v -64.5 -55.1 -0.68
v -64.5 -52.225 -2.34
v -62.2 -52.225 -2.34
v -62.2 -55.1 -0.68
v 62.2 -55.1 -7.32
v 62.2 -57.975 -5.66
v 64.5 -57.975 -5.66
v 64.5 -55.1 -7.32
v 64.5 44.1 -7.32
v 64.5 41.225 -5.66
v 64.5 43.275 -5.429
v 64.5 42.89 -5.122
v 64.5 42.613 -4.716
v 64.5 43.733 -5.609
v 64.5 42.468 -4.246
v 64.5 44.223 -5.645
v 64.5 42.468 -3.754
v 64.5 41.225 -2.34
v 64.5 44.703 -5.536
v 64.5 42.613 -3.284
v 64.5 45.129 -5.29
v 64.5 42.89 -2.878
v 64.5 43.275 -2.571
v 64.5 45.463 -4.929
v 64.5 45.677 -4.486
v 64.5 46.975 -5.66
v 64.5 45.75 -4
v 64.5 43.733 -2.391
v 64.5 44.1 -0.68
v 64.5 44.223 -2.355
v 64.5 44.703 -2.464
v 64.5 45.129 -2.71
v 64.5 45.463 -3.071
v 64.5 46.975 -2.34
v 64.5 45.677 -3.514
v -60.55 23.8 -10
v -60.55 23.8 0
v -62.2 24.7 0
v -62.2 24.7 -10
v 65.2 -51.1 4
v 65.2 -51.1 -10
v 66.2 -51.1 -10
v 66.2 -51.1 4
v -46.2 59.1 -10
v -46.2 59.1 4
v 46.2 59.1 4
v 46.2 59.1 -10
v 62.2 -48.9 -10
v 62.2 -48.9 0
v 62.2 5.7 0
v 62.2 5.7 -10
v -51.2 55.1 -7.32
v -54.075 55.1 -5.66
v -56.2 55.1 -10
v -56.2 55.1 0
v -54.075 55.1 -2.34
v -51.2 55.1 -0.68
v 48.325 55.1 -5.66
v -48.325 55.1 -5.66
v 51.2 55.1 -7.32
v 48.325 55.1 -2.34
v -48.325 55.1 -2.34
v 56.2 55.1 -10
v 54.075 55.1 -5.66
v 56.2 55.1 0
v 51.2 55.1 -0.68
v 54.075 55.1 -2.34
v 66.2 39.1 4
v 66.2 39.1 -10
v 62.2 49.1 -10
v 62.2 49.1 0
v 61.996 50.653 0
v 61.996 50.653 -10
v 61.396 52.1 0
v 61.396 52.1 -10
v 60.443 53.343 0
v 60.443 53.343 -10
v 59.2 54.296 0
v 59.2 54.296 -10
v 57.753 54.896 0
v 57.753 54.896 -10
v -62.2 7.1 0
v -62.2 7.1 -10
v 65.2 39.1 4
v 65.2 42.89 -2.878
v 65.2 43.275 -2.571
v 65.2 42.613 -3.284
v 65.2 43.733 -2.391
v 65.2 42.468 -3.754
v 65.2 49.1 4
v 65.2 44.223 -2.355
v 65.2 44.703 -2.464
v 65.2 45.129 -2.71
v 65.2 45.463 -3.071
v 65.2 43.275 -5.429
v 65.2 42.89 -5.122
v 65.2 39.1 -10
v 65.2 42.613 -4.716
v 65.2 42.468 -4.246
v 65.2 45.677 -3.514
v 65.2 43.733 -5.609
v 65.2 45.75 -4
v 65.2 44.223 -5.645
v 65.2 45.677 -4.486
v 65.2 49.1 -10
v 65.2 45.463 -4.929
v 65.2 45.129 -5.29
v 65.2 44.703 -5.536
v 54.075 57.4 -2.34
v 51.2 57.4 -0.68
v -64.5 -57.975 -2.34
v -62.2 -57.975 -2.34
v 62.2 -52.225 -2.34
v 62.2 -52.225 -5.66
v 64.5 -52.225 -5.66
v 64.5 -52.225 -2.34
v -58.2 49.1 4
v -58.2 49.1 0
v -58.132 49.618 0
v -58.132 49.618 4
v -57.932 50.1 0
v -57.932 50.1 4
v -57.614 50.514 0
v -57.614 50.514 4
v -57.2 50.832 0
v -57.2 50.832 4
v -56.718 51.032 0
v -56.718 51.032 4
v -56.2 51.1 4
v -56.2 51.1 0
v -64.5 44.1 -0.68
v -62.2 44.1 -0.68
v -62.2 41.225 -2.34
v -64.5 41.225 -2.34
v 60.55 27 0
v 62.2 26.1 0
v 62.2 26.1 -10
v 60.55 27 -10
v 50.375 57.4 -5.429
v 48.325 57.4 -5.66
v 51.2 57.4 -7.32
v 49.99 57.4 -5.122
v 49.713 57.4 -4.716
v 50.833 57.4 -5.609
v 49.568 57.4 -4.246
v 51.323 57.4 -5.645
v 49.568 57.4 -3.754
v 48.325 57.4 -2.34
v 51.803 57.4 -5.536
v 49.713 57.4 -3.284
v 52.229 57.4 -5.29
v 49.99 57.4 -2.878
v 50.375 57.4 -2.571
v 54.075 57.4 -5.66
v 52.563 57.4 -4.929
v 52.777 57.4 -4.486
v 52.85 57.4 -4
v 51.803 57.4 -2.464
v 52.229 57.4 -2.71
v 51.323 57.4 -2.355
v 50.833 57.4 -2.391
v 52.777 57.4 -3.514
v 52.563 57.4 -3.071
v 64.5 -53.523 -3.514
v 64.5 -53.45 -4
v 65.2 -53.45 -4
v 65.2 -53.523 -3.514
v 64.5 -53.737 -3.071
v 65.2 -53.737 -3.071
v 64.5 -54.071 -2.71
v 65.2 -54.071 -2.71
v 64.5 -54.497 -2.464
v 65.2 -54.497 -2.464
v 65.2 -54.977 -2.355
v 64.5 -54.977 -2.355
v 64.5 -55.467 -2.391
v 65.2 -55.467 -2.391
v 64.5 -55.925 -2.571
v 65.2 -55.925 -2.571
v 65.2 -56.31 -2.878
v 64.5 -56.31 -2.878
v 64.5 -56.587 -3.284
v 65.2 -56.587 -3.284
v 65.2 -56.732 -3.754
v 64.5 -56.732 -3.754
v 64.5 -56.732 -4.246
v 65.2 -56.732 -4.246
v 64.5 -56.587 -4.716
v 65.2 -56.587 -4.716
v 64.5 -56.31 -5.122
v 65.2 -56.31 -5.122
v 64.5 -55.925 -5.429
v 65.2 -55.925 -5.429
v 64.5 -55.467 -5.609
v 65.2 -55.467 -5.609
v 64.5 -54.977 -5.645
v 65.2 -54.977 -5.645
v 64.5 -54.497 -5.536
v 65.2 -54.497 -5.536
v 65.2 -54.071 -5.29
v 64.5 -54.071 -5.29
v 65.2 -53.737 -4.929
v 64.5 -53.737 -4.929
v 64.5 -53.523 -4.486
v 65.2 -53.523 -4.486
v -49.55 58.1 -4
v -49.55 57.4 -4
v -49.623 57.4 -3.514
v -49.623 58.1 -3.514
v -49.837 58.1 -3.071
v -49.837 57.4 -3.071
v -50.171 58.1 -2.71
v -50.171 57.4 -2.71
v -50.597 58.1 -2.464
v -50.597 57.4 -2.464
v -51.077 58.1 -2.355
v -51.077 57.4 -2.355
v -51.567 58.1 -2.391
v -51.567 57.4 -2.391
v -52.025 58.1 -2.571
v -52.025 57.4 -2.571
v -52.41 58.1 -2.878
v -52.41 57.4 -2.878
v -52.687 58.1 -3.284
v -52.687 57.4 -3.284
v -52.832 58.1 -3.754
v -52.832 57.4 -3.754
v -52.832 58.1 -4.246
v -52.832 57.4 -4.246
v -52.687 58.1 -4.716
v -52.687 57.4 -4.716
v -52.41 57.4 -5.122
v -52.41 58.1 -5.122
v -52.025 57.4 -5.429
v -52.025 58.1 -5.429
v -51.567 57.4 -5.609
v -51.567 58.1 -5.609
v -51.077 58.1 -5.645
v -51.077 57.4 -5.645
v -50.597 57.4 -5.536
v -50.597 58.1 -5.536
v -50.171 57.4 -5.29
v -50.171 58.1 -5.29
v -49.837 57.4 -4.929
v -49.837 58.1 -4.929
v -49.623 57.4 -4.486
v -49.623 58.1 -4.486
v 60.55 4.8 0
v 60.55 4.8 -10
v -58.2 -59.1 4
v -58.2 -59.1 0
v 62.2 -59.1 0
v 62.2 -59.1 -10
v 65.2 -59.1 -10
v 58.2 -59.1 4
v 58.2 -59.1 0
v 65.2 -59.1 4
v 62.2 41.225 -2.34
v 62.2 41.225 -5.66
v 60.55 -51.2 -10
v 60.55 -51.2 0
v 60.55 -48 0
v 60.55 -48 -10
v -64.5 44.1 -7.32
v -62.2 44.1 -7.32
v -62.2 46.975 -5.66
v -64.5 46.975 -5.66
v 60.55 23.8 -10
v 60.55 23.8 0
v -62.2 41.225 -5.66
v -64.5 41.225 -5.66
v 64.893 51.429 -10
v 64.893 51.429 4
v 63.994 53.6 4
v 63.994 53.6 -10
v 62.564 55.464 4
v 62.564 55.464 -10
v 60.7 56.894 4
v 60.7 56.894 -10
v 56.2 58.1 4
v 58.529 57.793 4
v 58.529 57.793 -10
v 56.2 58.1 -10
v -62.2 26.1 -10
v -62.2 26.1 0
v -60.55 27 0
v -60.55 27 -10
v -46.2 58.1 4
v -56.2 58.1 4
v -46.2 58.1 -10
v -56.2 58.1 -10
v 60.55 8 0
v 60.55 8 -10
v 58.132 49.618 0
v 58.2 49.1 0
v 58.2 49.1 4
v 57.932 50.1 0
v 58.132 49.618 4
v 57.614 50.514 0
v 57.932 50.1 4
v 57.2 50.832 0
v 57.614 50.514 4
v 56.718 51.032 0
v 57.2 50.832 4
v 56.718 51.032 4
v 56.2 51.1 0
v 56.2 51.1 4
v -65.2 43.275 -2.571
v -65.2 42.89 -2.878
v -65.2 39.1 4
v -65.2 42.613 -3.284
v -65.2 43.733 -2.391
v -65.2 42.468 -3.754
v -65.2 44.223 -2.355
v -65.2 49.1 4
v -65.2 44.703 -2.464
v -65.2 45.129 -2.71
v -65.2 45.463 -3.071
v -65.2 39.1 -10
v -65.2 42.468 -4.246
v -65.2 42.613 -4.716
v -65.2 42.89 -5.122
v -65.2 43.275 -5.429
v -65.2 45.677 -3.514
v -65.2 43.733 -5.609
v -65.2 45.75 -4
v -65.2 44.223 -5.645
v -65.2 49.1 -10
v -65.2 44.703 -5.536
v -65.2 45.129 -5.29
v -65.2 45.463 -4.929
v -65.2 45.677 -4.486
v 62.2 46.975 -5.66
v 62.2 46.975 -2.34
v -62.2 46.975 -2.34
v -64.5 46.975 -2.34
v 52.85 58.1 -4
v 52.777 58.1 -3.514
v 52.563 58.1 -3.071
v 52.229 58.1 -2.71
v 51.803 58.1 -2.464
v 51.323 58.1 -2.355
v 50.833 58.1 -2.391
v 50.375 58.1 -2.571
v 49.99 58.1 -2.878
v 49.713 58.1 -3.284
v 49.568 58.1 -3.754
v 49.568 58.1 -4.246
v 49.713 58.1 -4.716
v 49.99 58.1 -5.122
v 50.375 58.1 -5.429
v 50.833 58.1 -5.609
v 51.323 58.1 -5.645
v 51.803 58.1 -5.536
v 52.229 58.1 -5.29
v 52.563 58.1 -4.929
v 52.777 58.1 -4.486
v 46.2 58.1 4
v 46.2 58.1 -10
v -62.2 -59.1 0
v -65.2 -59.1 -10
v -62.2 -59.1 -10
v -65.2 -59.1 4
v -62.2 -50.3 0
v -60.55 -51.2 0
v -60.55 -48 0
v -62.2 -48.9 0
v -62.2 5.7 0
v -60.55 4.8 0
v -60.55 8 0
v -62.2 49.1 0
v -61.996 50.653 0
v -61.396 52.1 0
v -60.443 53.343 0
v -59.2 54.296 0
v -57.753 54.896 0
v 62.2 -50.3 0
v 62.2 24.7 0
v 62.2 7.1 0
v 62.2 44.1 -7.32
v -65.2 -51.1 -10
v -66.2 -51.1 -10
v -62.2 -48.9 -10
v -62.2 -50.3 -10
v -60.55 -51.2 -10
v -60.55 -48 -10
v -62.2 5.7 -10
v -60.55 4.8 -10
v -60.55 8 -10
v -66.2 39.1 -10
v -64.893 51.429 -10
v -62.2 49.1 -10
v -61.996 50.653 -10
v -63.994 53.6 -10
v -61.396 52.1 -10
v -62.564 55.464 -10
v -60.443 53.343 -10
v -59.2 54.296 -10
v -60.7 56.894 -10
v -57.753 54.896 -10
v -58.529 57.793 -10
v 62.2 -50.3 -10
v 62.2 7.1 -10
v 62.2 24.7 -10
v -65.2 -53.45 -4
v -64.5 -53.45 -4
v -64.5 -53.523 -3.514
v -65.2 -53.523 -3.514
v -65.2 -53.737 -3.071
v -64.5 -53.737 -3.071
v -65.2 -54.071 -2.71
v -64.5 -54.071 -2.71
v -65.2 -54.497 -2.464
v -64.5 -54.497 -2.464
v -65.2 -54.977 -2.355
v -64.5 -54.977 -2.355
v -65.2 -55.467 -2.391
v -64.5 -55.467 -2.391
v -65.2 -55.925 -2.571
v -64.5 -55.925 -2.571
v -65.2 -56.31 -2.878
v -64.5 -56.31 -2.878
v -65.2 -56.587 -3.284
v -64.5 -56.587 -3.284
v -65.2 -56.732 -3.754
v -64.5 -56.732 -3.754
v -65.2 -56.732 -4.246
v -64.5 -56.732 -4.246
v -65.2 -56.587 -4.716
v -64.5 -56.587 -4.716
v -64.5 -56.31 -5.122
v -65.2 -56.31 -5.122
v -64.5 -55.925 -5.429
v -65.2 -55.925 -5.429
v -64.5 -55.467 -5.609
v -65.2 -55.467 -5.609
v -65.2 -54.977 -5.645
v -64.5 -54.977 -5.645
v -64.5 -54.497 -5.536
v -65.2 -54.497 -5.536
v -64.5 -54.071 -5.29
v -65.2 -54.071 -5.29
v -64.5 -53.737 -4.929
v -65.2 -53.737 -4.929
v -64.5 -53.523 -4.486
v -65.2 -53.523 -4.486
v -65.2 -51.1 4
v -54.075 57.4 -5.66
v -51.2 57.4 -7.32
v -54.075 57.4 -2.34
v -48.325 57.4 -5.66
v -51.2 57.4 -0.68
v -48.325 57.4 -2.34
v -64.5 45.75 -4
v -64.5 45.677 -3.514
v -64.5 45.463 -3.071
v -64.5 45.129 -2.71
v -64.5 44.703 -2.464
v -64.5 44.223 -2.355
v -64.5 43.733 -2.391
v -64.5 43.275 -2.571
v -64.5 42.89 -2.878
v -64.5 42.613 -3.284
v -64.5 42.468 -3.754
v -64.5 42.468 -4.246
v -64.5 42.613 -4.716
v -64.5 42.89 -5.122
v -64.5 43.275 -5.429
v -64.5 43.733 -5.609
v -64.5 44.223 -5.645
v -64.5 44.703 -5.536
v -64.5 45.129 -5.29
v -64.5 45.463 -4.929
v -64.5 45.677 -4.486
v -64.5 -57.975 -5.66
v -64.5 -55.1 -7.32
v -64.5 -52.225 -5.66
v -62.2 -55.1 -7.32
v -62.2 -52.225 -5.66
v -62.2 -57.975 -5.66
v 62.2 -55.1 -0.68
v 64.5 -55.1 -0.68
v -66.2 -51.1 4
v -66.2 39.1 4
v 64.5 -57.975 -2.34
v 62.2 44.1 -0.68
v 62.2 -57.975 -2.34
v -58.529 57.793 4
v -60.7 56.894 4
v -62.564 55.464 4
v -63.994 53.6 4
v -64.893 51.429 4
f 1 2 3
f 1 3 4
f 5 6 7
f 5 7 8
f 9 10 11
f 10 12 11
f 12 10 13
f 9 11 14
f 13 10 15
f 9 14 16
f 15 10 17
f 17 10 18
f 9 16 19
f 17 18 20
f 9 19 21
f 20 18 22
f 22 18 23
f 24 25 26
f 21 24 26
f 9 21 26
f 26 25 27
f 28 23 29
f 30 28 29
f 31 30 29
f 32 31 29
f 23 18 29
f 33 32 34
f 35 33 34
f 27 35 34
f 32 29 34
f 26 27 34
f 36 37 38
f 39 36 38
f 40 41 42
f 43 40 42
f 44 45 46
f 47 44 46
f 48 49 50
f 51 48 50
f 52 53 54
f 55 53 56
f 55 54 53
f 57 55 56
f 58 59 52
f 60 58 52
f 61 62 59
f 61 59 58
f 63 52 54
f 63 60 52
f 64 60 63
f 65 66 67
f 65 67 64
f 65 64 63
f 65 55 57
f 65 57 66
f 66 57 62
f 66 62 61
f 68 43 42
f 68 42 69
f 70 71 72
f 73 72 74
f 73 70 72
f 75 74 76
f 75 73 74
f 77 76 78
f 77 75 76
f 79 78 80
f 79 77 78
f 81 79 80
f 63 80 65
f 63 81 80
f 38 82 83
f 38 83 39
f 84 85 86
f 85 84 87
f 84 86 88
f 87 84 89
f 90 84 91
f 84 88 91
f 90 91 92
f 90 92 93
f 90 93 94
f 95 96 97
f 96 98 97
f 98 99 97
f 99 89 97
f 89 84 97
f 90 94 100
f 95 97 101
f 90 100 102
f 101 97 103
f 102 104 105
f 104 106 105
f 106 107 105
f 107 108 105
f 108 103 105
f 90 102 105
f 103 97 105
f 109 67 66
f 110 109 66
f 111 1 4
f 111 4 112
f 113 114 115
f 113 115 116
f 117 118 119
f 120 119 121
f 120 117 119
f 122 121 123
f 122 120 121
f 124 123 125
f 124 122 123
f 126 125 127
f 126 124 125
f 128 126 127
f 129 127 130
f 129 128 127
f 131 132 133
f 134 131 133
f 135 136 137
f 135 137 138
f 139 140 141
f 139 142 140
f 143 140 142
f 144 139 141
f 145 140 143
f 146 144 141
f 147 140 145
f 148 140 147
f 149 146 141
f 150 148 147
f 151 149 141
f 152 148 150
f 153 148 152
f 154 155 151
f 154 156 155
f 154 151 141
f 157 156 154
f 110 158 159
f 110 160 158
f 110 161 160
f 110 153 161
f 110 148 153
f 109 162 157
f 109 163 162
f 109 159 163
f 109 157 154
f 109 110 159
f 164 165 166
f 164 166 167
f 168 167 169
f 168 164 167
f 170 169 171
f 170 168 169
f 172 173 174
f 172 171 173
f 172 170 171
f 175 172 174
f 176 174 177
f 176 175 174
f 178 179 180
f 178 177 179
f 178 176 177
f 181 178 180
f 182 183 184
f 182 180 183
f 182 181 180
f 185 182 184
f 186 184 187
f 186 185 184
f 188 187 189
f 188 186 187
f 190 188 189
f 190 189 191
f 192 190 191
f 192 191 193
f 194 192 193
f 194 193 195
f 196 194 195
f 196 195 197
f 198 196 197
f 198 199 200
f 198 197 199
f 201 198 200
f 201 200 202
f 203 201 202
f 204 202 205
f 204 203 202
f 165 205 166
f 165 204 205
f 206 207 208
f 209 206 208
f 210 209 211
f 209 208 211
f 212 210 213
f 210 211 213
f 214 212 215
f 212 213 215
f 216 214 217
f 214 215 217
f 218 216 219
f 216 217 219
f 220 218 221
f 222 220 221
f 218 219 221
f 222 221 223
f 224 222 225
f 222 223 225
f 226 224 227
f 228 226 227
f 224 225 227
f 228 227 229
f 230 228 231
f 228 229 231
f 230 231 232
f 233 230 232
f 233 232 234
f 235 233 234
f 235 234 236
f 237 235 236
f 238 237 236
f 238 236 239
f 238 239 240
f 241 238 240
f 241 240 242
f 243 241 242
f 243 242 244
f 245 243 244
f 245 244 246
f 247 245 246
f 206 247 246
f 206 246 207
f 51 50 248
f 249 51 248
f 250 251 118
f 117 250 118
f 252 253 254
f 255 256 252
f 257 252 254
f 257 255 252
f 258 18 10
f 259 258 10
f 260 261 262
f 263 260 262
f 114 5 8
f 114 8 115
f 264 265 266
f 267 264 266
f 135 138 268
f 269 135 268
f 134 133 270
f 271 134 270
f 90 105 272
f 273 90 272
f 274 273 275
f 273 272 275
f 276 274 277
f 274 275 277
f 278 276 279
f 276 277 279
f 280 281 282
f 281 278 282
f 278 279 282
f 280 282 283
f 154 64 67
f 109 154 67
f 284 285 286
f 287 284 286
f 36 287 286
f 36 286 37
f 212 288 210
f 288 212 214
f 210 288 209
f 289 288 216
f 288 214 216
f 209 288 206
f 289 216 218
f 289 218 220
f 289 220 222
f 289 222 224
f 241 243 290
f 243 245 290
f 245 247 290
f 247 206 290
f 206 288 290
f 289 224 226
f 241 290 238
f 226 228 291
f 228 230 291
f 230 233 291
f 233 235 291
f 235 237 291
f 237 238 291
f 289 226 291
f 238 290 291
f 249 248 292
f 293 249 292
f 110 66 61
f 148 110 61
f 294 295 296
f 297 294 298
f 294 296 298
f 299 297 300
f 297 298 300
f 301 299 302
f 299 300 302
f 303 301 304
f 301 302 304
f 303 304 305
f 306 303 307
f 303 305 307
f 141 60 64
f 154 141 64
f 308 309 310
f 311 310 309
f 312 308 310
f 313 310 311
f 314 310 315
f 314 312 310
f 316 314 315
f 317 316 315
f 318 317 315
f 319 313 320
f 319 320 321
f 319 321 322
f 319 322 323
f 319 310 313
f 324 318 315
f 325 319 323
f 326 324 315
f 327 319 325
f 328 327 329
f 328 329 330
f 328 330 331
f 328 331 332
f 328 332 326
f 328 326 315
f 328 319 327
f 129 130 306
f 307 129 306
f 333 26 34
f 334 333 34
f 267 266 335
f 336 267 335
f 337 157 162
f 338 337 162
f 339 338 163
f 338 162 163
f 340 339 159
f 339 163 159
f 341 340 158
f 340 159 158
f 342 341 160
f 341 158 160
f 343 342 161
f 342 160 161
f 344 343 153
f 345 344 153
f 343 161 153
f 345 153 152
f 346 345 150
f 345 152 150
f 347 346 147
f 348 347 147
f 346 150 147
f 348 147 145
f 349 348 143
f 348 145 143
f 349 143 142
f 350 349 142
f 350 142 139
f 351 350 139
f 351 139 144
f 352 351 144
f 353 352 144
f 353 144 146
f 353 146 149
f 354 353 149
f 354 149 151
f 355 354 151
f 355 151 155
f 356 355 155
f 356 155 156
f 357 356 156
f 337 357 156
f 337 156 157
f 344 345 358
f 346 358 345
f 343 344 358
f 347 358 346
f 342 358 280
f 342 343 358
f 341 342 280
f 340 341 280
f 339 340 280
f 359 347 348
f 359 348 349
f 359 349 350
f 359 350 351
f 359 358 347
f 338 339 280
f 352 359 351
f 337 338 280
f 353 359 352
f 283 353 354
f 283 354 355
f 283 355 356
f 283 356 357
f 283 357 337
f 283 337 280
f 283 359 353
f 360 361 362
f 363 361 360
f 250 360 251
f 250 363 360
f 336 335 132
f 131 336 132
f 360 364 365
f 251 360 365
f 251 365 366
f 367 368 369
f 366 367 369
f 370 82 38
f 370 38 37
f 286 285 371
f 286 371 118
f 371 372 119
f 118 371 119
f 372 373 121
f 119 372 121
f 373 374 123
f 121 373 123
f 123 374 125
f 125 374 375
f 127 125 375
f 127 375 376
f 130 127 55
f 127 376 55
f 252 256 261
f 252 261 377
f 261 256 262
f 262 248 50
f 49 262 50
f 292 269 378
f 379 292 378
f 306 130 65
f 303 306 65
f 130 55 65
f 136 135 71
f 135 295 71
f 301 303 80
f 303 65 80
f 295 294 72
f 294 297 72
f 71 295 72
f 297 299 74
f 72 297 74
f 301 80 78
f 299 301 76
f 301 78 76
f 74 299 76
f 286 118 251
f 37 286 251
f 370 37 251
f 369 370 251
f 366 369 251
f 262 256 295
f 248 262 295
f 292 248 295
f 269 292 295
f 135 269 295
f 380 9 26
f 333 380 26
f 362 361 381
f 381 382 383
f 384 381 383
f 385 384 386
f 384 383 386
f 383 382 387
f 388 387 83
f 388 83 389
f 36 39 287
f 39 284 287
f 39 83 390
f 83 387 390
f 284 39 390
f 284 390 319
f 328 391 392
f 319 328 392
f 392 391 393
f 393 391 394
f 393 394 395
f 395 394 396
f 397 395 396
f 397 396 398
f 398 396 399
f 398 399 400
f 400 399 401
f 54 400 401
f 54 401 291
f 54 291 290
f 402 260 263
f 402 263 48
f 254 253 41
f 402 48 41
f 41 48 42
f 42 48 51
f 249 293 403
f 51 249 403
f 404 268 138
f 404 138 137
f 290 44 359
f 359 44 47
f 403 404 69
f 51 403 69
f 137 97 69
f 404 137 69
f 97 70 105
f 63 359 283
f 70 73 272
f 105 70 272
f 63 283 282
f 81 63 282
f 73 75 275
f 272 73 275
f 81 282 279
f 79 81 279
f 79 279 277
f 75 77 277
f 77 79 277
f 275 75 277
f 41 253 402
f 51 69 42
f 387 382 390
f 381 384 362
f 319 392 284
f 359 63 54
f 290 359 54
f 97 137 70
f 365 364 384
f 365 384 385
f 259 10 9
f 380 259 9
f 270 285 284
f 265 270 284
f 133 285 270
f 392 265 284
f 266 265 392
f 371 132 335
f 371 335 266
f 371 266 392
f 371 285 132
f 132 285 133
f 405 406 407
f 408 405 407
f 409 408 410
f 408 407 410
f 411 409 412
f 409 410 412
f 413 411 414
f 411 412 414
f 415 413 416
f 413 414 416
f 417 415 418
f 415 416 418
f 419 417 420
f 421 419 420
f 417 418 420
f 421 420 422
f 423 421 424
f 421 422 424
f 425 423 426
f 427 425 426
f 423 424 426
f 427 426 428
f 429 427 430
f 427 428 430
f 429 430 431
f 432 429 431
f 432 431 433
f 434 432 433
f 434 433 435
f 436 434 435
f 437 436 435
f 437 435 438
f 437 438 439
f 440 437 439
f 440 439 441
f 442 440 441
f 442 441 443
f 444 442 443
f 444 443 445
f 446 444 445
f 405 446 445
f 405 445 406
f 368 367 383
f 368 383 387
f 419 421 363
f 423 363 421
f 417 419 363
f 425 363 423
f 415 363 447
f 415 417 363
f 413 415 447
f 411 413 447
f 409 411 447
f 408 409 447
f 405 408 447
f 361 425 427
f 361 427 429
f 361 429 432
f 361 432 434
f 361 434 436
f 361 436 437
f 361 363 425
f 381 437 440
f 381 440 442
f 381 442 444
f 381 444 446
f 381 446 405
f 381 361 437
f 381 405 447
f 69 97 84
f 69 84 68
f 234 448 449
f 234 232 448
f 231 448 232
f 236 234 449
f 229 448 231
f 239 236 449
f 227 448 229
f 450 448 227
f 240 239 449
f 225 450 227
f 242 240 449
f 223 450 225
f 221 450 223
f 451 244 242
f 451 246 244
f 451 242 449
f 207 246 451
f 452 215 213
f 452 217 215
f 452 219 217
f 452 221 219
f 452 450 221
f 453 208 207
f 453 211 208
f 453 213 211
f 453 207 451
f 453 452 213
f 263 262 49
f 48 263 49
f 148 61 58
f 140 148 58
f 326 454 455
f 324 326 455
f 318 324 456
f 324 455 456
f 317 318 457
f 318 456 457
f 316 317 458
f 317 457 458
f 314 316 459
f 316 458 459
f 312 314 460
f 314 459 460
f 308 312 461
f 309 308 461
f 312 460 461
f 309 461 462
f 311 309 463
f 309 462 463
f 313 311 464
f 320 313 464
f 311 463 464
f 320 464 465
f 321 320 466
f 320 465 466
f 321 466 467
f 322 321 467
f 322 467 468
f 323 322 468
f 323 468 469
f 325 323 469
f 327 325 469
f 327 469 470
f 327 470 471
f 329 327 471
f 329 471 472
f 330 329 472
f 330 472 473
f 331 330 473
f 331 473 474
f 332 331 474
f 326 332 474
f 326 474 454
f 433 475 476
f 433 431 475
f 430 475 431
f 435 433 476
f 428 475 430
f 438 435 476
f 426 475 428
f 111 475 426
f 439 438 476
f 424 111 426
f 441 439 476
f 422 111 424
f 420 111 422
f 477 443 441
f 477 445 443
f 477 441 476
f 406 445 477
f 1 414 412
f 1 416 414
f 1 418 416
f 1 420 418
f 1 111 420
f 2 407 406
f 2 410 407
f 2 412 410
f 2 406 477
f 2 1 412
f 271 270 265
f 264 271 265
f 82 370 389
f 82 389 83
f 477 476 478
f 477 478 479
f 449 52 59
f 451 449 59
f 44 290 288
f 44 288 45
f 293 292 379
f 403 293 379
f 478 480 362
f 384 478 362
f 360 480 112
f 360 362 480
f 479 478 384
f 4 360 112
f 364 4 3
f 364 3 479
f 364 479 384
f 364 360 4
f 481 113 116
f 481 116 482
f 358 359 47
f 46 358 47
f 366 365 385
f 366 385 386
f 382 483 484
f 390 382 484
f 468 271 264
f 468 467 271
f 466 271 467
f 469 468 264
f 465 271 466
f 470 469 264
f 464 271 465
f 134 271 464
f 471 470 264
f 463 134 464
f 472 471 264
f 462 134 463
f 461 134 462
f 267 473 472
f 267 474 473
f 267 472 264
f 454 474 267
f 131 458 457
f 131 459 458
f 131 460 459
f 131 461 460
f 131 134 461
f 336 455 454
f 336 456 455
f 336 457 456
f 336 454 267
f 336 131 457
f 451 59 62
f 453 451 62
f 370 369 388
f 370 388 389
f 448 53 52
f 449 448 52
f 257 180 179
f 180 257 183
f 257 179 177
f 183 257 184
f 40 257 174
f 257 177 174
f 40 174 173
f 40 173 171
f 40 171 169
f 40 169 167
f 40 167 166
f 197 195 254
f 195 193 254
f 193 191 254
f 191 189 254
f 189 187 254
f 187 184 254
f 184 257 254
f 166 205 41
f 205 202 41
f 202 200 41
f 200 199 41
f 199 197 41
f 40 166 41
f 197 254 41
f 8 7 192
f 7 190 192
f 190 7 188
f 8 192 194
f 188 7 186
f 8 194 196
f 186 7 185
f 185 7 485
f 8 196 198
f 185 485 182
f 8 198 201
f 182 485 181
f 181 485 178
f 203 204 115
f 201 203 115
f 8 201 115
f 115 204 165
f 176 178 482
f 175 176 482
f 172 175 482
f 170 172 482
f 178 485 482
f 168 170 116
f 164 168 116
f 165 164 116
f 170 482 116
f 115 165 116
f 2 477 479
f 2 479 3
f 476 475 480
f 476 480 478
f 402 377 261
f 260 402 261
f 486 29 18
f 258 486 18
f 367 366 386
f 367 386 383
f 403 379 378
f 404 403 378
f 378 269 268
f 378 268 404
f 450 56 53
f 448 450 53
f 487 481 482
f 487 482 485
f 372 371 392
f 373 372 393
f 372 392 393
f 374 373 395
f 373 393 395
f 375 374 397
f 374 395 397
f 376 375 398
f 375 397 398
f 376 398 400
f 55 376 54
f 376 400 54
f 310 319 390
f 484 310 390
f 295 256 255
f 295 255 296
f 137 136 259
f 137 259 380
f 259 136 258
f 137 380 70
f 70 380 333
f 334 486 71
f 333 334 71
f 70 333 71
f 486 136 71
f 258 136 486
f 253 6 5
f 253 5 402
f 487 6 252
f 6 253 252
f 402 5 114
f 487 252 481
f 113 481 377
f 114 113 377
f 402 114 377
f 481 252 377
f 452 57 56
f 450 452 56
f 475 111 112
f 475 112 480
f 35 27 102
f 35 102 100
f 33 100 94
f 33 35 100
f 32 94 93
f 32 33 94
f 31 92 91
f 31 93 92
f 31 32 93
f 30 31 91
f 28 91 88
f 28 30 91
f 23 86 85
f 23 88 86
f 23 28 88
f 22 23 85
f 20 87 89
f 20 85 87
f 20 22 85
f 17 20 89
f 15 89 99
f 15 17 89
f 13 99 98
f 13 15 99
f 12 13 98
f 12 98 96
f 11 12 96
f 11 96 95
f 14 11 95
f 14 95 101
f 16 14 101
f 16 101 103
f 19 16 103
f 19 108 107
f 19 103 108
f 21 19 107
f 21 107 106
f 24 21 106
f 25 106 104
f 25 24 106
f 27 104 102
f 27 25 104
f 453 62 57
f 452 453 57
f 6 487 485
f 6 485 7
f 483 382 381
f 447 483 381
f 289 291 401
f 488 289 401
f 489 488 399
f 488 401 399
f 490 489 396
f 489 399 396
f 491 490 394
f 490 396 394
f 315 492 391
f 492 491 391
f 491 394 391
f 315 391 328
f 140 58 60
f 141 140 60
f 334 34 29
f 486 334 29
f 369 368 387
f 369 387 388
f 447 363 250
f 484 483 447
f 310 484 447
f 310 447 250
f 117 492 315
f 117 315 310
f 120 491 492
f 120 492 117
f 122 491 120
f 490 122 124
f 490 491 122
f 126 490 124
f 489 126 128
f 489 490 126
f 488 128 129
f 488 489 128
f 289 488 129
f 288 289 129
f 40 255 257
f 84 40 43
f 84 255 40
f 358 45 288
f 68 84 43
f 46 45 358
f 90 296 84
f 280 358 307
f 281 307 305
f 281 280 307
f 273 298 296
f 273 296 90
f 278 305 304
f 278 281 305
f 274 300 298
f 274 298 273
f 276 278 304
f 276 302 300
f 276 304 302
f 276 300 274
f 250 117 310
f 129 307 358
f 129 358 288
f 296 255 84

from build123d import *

# Parameters (mm, degrees)
SKETCH_W             = 132.4
SKETCH_H             = 118.2
PAD_DEPTH            = 4
PAD_DEPTH_BACK       = 10
SKETCH001_W          = 124.4
SKETCH001_H          = 114.2
POCKET_DEPTH         = 10.001
SKETCH002_W          = 116.4
SKETCH002_H          = 110.2
POCKET001_DEPTH      = 5
FILLET_R             = 6
FILLET001_R          = 10
FILLET002_R          = 2
POCKET002_DEPTH      = 10.001
POCKET002_DEPTH_BACK = 4.001
PAD001_DEPTH         = 10
SKETCH005_W          = 1
SKETCH005_H          = 8
POCKET003_DEPTH      = 10.001
POCKET003_DEPTH_BACK = 4.001
SKETCH006_R          = 1.65
POCKET004_DEPTH      = 66.201
POCKET004_DEPTH_BACK = 66.201
POCKET005_DEPTH      = 64.5
SKETCH008_R          = 1.65
POCKET006_DEPTH      = 59.101
POCKET006_DEPTH_BACK = 59.101
POCKET007_DEPTH      = 57.4


with BuildPart() as part:
    # Sketch → Pad (new body, two sides)
    with BuildSketch(Plane.XY) as pad_sk:
        Rectangle(SKETCH_W, SKETCH_H)
    extrude(amount=PAD_DEPTH)
    extrude(pad_sk.sketch, amount=-PAD_DEPTH_BACK)

    # Sketch001 → Pocket (cut, through all)
    with BuildSketch(Plane.XY):
        with Locations((0, -2)):
            Rectangle(SKETCH001_W, SKETCH001_H)
    extrude(amount=-POCKET_DEPTH, mode=Mode.SUBTRACT)

    # Sketch002 → Pocket001 (cut)
    with BuildSketch(Plane.XY):
        with Locations((0, -4)):
            Rectangle(SKETCH002_W, SKETCH002_H)
    extrude(amount=POCKET001_DEPTH, mode=Mode.SUBTRACT)

    # Fillet
    fillet_edges = [part.edges().sort_by_distance(p)[0] for p in [
        (-62.2, 55.1, -5),
        (62.2, 55.1, -5),
    ]]
    fillet(fillet_edges, radius=FILLET_R)

    # Fillet001
    fillet001_edges = [part.edges().sort_by_distance(p)[0] for p in [
        (-66.2, 59.1, -3),
        (66.2, 59.1, -3),
    ]]
    fillet(fillet001_edges, radius=FILLET001_R)

    # Fillet002
    fillet002_edges = [part.edges().sort_by_distance(p)[0] for p in [
        (-58.2, 51.1, 2),
        (58.2, 51.1, 2),
    ]]
    fillet(fillet002_edges, radius=FILLET002_R)

    # Sketch003 → Pocket002 (cut, two sides)
    with BuildSketch(Plane.XY) as pocket002_sk:
        with BuildLine():
            Line((-65.2, 39.1), (-65.2, 49.1))
            ThreePointArc((-56.2, 58.1), (-62.563961, 55.463961), (-65.2, 49.1))
            Line((-46.2, 58.1), (-56.2, 58.1))
            Line((-46.2, 58.1), (-46.2, 59.1))
            Line((-46.2, 59.1), (-56.2, 59.1))
            ThreePointArc((-56.2, 59.1), (-63.271068, 56.171068), (-66.2, 49.1))
            Line((-66.2, 39.1), (-66.2, 49.1))
            Line((-65.2, 39.1), (-66.2, 39.1))
        make_face()
        with BuildLine():
            Line((65.2, 39.1), (65.2, 49.1))
            ThreePointArc((65.2, 49.1), (62.563961, 55.463961), (56.2, 58.1))
            Line((46.2, 58.1), (56.2, 58.1))
            Line((46.2, 58.1), (46.2, 59.1))
            Line((46.2, 59.1), (56.2, 59.1))
            ThreePointArc((66.2, 49.1), (63.271068, 56.171068), (56.2, 59.1))
            Line((66.2, 39.1), (66.2, 49.1))
            Line((65.2, 39.1), (66.2, 39.1))
        make_face()
    extrude(amount=-POCKET002_DEPTH, mode=Mode.SUBTRACT)
    extrude(pocket002_sk.sketch, amount=POCKET002_DEPTH_BACK, mode=Mode.SUBTRACT)

    # Sketch004 → Pad001 (join)
    with BuildSketch(Plane.XY):
        Polygon((-62.2, 24.7), (-62.2, 26.1), (-60.55, 27), (-60.55, 23.8), align=None)
        Polygon((-62.2, 5.7), (-60.55, 4.8), (-60.55, 8), (-62.2, 7.1), align=None)
        Polygon((-62.2, -50.3), (-60.55, -51.2), (-60.55, -48), (-62.2, -48.9), align=None)
        Polygon((62.2, 24.7), (62.2, 26.1), (60.55, 27), (60.55, 23.8), align=None)
        Polygon((62.2, 5.7), (60.55, 4.8), (60.55, 8), (62.2, 7.1), align=None)
        Polygon((62.2, -50.3), (60.55, -51.2), (60.55, -48), (62.2, -48.9), align=None)
    extrude(amount=-PAD001_DEPTH)

    # Sketch005 → Pocket003 (cut, two sides)
    with BuildSketch(Plane.XY) as pocket003_sk:
        with Locations((-65.7, -55.1)):
            Rectangle(SKETCH005_W, SKETCH005_H)
        with Locations((65.7, -55.1)):
            Rectangle(SKETCH005_W, SKETCH005_H)
    extrude(amount=-POCKET003_DEPTH, mode=Mode.SUBTRACT)
    extrude(pocket003_sk.sketch, amount=POCKET003_DEPTH_BACK, mode=Mode.SUBTRACT)

    # Sketch006 → Pocket004 (cut, two sides)
    with BuildSketch(Plane.YZ) as pocket004_sk:
        with Locations((-55.1, -4)):
            Circle(SKETCH006_R)
        with Locations((44.1, -4)):
            Circle(SKETCH006_R)
    extrude(amount=-POCKET004_DEPTH, mode=Mode.SUBTRACT)
    extrude(pocket004_sk.sketch, amount=POCKET004_DEPTH_BACK, mode=Mode.SUBTRACT)

    # Sketch007 → Pocket005 (cut, symmetric)
    with BuildSketch(Plane.YZ):
        Polygon((-57.975, -5.659882), (-55.1, -7.319764), (-52.225, -5.659882), (-52.225, -2.340118), (-55.1, -0.680236), (-57.975, -2.340118), align=None)
        Polygon((44.1, -7.319764), (46.975, -5.659882), (46.975, -2.340118), (44.1, -0.680236), (41.225, -2.340118), (41.225, -5.659882), align=None)
    extrude(amount=POCKET005_DEPTH, both=True, mode=Mode.SUBTRACT)

    # Sketch008 → Pocket006 (cut, two sides)
    with BuildSketch(Plane.XZ) as pocket006_sk:
        with Locations((-51.2, -4)):
            Circle(SKETCH008_R)
        with Locations((51.2, -4)):
            Circle(SKETCH008_R)
    extrude(amount=-POCKET006_DEPTH, mode=Mode.SUBTRACT)
    extrude(pocket006_sk.sketch, amount=POCKET006_DEPTH_BACK, mode=Mode.SUBTRACT)

    # Sketch009 → Pocket007 (cut)
    with BuildSketch(Plane.XZ):
        Polygon((-51.2, -7.319764), (-48.325, -5.659882), (-48.325, -2.340118), (-51.2, -0.680236), (-54.075, -2.340118), (-54.075, -5.659882), align=None)
        Polygon((51.2, -7.319764), (54.075, -5.659882), (54.075, -2.340118), (51.2, -0.680236), (48.325, -2.340118), (48.325, -5.659882), align=None)
    extrude(amount=-POCKET007_DEPTH, mode=Mode.SUBTRACT)


solid = part.part
